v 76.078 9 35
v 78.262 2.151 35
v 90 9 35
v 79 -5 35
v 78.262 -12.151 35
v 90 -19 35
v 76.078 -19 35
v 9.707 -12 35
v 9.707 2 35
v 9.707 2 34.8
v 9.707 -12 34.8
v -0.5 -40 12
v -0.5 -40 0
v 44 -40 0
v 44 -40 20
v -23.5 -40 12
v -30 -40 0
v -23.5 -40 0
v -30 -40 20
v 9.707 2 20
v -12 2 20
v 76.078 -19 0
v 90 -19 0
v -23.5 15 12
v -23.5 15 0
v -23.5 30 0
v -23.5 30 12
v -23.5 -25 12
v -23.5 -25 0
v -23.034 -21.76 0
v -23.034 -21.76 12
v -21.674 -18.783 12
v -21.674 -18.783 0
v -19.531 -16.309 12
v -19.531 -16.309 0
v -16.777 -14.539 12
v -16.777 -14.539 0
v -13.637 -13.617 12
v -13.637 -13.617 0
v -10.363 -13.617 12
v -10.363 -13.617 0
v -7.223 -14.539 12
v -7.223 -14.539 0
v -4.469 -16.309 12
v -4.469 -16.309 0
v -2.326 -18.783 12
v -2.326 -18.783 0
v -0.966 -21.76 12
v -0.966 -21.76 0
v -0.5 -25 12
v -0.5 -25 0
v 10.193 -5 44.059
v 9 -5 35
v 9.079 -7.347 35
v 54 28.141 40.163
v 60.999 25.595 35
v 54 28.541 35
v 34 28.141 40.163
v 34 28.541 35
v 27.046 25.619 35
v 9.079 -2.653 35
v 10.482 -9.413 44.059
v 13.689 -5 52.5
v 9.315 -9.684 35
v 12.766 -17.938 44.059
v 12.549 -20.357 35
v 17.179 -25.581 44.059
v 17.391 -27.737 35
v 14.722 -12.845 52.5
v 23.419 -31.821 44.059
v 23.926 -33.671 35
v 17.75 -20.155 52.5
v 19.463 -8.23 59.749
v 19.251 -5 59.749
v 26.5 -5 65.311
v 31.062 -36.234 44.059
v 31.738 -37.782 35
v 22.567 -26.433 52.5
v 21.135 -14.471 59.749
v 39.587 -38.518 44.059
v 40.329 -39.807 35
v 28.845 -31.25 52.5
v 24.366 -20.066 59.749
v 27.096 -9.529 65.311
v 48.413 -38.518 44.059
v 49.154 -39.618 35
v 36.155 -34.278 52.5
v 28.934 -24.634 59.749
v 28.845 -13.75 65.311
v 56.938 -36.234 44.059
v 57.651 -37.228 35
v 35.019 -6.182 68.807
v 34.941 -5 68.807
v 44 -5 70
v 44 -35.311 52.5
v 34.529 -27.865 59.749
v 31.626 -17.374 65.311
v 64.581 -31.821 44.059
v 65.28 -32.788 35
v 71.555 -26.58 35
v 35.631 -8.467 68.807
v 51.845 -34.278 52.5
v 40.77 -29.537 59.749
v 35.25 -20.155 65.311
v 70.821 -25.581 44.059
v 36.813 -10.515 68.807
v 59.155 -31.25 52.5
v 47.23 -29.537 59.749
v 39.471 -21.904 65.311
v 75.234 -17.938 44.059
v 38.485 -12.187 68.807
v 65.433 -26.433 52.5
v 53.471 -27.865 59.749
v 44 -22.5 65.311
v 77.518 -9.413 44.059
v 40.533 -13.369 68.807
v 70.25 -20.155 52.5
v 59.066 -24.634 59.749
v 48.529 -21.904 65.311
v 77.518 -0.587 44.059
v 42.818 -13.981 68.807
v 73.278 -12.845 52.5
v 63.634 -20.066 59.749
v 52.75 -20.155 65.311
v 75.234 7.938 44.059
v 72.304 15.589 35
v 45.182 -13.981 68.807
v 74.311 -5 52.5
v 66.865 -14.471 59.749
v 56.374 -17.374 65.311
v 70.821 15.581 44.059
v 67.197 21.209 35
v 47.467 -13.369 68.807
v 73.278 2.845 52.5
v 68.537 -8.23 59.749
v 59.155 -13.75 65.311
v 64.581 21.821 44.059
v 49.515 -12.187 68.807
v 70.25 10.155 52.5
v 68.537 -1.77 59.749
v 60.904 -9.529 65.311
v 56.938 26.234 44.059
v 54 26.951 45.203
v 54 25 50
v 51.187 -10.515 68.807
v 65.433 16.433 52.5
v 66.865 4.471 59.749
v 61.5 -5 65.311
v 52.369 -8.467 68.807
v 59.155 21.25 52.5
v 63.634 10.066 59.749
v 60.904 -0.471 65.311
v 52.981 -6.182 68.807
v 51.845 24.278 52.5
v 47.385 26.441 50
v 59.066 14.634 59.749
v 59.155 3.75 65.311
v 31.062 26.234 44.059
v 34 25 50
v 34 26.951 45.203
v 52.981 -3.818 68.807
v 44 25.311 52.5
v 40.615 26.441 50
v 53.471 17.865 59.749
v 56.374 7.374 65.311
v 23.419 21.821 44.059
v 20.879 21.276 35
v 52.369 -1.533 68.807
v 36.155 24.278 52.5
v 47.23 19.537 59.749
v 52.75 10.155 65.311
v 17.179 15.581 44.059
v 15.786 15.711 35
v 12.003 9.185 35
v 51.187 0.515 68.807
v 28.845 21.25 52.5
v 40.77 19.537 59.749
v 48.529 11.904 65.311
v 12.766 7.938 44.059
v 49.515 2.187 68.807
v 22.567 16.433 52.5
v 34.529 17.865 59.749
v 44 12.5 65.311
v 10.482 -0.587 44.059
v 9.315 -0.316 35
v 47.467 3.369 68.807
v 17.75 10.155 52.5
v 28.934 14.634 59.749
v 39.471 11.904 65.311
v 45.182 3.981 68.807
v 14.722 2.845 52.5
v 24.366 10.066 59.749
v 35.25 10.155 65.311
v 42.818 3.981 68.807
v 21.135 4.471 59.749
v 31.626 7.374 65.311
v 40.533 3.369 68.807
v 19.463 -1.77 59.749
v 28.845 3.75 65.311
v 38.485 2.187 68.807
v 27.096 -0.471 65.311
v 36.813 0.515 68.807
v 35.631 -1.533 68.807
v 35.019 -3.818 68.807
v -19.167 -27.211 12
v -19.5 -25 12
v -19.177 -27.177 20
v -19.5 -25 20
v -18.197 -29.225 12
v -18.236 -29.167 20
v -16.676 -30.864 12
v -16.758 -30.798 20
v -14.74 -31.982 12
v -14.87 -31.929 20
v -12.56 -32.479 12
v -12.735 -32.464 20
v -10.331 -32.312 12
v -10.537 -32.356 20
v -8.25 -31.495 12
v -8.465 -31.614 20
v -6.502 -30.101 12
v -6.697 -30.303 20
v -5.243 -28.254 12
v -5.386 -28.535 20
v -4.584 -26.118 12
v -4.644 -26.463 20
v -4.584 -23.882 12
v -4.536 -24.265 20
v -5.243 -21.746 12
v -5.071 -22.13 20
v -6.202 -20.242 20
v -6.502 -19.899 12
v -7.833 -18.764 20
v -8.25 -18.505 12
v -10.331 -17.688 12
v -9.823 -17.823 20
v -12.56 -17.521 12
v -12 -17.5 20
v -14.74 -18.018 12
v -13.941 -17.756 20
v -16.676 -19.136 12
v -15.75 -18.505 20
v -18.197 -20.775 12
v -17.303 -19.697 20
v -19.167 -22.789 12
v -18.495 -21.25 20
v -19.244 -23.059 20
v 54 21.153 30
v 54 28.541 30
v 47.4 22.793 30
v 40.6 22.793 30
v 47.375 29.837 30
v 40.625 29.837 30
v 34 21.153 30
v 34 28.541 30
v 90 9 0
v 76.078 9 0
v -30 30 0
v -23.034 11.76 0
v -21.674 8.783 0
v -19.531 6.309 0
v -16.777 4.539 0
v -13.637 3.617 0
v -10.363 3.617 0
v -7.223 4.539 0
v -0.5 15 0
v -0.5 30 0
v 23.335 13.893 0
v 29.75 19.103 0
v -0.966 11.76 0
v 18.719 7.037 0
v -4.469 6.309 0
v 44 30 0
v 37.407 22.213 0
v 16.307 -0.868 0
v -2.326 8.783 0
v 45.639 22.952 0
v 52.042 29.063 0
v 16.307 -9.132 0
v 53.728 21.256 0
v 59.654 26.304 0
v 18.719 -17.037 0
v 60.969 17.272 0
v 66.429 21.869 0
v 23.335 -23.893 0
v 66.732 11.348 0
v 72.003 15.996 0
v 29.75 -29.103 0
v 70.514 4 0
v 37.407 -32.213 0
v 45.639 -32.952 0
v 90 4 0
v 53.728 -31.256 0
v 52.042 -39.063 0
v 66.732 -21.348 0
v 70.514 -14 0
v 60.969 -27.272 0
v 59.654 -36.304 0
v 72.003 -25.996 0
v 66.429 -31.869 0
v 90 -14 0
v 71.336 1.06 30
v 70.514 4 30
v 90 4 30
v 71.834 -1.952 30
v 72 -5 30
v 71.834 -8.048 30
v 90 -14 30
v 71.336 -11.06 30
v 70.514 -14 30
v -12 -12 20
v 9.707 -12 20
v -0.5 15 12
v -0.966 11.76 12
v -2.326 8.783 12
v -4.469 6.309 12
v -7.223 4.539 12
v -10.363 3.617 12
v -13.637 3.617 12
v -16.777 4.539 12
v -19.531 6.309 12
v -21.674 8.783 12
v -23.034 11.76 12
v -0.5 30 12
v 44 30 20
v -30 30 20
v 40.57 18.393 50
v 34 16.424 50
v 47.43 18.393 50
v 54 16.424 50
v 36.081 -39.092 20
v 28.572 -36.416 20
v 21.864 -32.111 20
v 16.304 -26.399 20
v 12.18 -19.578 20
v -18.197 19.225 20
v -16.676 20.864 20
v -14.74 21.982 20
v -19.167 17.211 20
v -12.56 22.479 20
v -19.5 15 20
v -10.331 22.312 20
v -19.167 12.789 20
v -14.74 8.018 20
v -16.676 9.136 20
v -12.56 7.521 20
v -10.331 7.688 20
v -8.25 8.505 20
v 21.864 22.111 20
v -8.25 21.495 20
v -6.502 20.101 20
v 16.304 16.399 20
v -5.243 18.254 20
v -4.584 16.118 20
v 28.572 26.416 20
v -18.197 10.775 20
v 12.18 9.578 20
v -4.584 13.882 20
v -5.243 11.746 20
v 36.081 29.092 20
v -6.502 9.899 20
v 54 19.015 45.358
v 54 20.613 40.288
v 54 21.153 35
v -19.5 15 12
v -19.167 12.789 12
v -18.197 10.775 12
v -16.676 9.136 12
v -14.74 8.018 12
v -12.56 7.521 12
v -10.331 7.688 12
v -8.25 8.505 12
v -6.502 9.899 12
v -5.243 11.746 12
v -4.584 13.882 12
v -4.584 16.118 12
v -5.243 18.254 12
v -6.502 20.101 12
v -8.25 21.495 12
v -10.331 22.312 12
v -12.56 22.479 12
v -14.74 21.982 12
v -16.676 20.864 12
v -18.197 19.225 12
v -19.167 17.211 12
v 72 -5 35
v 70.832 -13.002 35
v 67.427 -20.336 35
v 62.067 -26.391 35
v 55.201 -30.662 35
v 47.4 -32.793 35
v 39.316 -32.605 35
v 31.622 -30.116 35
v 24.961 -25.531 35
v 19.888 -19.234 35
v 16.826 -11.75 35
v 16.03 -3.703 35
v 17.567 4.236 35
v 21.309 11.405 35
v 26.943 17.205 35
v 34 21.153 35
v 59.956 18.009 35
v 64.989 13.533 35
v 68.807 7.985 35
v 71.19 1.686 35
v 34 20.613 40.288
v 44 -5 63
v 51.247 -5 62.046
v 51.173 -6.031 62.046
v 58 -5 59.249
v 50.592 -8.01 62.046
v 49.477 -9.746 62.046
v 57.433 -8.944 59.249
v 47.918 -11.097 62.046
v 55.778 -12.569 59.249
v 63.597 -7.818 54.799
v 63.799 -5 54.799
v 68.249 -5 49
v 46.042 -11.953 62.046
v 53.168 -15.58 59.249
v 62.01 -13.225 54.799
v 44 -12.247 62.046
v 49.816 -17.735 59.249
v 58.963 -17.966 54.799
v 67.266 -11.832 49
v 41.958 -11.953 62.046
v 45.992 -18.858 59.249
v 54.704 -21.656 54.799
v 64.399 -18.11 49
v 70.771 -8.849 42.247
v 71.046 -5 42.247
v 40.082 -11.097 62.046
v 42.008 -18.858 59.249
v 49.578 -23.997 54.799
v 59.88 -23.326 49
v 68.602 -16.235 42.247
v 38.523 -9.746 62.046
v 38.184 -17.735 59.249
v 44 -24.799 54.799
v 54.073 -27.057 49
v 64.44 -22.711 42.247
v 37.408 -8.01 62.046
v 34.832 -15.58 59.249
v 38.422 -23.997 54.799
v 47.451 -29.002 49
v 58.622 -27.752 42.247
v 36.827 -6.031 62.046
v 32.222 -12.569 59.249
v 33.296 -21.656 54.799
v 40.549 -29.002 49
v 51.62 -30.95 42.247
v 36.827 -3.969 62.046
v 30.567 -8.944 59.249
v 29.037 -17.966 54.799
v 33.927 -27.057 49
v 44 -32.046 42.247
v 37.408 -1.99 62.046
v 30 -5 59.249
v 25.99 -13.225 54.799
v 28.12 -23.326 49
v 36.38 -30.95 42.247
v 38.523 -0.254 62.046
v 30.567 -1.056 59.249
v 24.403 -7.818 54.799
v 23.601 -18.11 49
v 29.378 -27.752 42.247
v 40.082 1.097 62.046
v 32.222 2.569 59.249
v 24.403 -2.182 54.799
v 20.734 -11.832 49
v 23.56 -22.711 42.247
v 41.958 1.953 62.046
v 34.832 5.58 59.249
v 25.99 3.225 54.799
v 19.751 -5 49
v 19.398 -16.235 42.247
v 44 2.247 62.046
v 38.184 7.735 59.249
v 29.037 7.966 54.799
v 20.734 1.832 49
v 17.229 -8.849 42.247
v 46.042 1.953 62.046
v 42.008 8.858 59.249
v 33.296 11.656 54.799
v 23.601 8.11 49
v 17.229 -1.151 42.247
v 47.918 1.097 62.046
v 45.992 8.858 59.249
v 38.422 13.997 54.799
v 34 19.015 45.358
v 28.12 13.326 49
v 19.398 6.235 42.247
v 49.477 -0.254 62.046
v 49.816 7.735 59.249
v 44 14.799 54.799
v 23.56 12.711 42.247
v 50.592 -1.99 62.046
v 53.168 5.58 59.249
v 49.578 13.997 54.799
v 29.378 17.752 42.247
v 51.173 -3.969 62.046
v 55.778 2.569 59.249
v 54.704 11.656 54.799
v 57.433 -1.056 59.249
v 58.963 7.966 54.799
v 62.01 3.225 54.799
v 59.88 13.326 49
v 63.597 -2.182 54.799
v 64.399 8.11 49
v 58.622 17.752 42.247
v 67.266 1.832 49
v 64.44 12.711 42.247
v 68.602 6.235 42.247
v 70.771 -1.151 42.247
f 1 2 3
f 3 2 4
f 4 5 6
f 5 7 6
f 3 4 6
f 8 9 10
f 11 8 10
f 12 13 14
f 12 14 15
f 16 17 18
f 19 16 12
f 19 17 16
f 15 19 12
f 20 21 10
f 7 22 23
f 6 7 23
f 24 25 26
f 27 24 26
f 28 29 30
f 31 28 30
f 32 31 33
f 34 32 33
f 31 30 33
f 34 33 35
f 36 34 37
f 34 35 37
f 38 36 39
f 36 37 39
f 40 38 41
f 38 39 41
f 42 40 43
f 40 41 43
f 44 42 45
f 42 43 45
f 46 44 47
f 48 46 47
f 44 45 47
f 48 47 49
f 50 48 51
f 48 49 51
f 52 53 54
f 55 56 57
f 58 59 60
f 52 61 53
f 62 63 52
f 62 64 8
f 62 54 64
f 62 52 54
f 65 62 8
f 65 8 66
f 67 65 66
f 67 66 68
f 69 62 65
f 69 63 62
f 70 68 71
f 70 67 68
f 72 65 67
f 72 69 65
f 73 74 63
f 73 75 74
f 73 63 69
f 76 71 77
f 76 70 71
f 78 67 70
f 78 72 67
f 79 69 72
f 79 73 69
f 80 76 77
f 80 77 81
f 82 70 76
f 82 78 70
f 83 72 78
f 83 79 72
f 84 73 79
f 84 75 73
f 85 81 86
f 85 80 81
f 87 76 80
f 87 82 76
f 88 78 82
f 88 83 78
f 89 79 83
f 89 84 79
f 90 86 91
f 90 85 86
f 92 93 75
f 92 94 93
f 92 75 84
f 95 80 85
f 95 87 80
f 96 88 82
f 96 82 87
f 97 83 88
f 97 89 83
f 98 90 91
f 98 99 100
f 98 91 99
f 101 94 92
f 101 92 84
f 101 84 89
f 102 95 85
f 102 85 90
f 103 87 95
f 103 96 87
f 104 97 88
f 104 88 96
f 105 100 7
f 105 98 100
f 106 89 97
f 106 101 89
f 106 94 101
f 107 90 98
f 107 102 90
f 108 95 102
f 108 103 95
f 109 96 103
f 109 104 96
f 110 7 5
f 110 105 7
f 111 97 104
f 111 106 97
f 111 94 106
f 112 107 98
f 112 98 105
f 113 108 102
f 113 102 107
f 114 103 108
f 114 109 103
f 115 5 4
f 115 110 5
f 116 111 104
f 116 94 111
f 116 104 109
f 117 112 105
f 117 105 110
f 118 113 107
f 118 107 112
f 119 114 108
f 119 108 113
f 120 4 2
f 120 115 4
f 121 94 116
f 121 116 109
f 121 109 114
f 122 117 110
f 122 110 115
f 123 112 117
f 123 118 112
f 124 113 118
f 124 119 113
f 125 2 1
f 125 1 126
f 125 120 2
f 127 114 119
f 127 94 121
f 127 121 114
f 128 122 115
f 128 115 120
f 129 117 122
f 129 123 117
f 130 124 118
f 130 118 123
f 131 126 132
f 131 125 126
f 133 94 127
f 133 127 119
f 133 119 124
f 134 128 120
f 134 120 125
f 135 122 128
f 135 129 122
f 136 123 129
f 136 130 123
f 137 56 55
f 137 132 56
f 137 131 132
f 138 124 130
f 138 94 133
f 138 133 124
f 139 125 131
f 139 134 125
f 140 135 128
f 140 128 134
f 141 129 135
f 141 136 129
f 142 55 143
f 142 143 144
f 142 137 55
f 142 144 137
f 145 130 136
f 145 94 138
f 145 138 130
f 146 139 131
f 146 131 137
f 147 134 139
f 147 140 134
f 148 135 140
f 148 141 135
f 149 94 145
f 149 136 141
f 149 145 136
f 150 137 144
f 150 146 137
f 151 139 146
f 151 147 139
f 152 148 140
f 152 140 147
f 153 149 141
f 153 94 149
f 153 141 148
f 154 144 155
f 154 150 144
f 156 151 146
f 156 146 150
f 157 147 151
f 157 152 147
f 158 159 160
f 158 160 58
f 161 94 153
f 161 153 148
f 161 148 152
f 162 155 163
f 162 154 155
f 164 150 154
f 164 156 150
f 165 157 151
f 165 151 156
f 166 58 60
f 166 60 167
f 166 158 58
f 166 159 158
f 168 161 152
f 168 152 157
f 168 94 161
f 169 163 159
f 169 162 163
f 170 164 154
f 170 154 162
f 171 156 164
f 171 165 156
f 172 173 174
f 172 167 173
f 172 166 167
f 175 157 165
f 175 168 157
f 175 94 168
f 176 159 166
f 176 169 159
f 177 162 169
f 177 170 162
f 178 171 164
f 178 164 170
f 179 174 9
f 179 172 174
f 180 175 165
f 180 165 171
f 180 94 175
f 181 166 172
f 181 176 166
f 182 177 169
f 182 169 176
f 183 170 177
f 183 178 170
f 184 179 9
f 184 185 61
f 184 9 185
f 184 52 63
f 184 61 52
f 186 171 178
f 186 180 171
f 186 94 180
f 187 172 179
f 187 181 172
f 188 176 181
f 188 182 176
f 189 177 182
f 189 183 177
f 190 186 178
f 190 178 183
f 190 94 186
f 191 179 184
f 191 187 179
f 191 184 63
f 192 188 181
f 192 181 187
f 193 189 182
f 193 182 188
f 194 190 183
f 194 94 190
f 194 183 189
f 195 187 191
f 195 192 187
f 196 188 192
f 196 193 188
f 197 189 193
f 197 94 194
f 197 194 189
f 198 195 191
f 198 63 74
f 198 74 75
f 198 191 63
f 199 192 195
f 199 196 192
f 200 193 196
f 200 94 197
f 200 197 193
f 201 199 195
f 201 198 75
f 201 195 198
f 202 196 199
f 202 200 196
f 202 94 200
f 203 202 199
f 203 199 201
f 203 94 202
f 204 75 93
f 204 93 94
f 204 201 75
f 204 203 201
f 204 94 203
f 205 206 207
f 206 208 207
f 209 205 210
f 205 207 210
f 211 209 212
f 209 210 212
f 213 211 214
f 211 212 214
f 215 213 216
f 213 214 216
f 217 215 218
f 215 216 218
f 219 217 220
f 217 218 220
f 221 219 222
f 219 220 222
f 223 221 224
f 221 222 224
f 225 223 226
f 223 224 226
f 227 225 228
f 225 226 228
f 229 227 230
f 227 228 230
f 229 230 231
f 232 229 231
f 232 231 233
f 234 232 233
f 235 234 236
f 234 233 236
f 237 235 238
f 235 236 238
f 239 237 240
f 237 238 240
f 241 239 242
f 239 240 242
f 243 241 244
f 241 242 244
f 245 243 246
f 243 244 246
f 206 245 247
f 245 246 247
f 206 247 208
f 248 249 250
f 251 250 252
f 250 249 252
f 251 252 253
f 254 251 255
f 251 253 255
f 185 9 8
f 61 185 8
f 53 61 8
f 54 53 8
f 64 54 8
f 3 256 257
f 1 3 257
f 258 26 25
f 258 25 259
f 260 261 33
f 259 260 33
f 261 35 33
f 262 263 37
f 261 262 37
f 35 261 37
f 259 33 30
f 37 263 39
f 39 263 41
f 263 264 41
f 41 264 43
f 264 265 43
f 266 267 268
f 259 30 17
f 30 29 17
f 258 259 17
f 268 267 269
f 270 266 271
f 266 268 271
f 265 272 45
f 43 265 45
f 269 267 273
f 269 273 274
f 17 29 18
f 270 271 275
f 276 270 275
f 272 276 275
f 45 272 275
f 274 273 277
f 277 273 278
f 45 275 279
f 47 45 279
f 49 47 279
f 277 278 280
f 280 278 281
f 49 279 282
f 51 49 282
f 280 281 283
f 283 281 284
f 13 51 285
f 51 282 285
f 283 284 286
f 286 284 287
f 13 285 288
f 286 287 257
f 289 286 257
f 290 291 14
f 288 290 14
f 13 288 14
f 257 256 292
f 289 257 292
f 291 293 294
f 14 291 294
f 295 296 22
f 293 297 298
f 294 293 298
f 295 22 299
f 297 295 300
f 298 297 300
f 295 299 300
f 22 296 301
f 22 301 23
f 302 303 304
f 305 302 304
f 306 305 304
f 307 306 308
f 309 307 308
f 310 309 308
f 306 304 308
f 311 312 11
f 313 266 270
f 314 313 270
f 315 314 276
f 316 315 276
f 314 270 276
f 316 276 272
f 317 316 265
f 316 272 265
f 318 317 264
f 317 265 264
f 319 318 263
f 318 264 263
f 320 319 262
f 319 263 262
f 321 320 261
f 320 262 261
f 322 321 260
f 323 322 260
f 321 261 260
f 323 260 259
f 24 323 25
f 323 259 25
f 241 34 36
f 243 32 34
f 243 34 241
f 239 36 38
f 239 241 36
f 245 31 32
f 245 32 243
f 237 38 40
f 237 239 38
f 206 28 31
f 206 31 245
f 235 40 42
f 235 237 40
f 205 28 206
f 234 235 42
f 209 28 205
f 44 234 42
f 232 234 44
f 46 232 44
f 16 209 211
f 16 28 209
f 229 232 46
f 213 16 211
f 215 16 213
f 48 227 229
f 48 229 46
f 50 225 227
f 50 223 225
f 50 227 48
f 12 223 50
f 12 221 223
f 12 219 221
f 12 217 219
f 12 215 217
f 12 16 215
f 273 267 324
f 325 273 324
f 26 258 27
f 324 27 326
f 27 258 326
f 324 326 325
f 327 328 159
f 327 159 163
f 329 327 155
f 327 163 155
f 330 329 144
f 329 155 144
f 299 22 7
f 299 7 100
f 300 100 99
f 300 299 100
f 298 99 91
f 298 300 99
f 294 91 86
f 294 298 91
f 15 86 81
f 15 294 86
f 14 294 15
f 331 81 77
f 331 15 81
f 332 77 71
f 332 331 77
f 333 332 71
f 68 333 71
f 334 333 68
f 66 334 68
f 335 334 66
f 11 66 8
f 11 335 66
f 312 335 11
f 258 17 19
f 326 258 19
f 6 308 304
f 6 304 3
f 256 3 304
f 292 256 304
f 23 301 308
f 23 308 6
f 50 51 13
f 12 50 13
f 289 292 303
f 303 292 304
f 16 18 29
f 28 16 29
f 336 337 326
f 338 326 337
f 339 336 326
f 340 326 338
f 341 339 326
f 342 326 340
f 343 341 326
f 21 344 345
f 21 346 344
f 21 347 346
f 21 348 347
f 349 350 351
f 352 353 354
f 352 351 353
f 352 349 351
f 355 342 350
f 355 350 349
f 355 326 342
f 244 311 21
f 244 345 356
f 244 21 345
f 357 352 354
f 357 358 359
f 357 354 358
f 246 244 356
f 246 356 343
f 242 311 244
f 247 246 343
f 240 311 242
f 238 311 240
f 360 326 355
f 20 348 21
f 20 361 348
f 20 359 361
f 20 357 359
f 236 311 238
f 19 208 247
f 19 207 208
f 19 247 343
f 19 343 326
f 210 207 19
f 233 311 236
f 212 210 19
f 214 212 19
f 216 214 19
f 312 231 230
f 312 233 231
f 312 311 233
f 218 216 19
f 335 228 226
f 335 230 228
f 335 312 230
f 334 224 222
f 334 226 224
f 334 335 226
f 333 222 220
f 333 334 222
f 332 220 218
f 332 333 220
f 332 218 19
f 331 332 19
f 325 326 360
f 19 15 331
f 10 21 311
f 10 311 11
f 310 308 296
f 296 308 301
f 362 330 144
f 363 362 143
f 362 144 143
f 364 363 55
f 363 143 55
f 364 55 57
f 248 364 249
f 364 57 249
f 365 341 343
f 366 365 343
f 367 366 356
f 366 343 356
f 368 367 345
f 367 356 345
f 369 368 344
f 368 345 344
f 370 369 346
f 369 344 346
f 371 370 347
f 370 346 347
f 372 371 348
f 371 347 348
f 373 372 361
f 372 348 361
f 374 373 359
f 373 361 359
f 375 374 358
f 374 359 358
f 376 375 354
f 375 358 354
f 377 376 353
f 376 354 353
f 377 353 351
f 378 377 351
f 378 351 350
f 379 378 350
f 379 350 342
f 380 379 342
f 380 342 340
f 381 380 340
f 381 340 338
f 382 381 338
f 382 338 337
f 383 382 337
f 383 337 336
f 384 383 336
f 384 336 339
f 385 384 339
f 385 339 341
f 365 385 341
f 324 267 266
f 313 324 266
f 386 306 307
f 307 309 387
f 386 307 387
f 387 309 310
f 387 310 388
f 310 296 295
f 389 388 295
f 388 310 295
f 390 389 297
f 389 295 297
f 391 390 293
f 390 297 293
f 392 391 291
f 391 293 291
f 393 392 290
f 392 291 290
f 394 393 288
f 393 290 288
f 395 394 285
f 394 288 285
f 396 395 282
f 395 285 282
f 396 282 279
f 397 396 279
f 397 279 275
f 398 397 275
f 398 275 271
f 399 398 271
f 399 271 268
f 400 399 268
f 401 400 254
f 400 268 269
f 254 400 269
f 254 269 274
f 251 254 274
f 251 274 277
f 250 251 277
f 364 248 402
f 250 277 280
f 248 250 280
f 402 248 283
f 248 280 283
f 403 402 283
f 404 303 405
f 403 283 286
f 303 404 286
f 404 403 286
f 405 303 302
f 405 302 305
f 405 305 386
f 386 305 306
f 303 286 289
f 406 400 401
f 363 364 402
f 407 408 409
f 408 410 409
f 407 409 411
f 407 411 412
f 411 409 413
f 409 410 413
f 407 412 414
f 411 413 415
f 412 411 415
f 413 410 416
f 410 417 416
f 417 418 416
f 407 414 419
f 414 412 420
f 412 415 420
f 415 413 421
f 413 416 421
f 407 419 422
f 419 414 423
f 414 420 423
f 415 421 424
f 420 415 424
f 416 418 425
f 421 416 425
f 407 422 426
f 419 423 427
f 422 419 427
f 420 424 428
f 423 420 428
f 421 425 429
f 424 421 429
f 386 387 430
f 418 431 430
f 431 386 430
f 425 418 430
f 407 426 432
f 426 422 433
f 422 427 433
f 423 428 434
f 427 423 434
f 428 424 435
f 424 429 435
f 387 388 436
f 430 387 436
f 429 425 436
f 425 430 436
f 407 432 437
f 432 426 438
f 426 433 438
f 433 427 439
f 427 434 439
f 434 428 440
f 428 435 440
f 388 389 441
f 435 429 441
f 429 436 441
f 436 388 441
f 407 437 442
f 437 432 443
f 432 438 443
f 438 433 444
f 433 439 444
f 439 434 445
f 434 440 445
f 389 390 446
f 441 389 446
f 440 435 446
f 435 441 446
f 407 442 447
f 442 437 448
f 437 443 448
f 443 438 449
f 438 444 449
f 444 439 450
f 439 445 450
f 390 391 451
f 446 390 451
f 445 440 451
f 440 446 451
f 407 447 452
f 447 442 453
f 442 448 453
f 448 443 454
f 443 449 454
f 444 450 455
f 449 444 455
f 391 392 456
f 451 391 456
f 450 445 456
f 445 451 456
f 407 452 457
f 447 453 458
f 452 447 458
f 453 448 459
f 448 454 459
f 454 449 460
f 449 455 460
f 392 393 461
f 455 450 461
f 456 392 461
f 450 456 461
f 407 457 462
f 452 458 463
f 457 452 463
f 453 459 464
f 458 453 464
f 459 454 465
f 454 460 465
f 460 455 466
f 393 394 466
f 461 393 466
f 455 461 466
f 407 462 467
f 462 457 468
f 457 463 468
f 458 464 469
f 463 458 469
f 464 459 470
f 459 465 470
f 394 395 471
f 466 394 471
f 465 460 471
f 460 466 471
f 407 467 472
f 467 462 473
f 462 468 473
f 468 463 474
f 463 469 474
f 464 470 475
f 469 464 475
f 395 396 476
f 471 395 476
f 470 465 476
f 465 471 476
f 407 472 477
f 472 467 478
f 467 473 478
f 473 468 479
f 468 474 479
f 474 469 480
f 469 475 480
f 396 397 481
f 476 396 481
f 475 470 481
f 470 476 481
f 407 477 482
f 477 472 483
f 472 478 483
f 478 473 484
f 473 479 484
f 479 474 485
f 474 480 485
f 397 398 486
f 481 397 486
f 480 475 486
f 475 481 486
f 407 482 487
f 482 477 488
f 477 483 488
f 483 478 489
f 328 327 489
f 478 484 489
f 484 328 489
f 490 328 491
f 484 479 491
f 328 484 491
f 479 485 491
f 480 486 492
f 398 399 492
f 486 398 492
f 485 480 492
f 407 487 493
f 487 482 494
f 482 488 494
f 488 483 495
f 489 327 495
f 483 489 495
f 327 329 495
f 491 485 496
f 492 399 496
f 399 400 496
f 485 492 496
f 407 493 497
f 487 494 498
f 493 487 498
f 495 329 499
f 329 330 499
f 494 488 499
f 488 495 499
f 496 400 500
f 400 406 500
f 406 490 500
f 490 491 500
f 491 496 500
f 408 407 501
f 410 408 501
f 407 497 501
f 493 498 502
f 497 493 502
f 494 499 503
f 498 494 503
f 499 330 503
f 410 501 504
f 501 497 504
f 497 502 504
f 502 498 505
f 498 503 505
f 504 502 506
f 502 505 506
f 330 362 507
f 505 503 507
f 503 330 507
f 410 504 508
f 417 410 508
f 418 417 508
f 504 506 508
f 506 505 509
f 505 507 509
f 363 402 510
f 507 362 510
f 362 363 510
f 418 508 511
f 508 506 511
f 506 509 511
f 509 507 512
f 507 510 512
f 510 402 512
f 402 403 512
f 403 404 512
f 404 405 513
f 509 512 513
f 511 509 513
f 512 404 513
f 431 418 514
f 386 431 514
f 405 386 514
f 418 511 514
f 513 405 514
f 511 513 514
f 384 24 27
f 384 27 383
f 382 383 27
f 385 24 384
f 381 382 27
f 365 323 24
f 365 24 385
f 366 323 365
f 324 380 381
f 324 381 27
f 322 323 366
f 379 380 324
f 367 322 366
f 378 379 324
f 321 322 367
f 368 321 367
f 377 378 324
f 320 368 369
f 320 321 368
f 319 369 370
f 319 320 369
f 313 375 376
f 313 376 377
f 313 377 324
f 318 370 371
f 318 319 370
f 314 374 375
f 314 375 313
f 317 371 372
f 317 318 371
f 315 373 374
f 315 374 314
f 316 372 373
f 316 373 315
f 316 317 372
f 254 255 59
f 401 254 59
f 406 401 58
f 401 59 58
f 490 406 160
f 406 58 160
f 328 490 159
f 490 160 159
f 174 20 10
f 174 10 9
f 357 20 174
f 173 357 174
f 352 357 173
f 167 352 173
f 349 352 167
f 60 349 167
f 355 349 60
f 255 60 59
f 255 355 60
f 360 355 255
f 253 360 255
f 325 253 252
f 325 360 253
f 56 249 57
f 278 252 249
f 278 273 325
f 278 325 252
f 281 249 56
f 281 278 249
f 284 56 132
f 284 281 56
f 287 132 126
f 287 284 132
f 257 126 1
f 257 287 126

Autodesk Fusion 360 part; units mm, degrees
box "BoxPrimitive1" add length 70 width 74 height 20 placed x (0, -1, 0) y (1, 0, 0) z (0, 0, 1) at (-30, 30, 0)
sketch "Sketch2" plane through (0, 0, 20) normal (0, 0, 1) x (-1, 0, 0)
  line L0 (30, 40) -> (-44, 40)
  line L1 (-44, 40) -> (-44, -30)
  line L2 (-44, -30) -> (30, -30)
  line L3 (30, -30) -> (30, 40)
  circle A0 centre (12, -15) radius 7.5
  circle A1 centre (12, 25) radius 7.5
  point P0 (30, -15)
  point P1 (30, 25)
  point P2 (12, -30)
  point P3 (12, -15)
  point P4 (12, 25)
  dimension "d9" = 15
  dimension "d10" = 15
extrude "Extrude1" cut sketch "Sketch2" against normal blind 378 contours A0 | A1
sketch "Sketch3" plane through (0, 0, 0) normal (0, 0, -1) x (1, 0, 0)
  circle A0 centre (-12, -15) radius 7.5
  circle A1 centre (-12, 25) radius 7.5
  line L0 (44, 40) -> (-30, 40)
  line L1 (-30, 40) -> (-30, -30)
  line L2 (-30, -30) -> (44, -30)
  line L3 (44, -30) -> (44, 40)
  line L4 (-0.5, 25) -> (-0.5, 40)
  line L5 (-0.5, 40) -> (-23.5, 40)
  line L6 (-23.5, 40) -> (-23.5, 25)
  line L7 (-23.5, -15) -> (-23.5, -30)
  line L8 (-23.5, -30) -> (-0.5, -30)
  line L9 (-0.5, -30) -> (-0.5, -15)
  arc A2 (-0.5, -15) -> (-23.5, -15) centre (-12, -15) ccw
  arc A3 (-23.5, 25) -> (-0.5, 25) centre (-12, 25) ccw
  dimension "d13" = 23
  dimension "d14" = 23
  dimension "d15" = 23
  dimension "d16" = 23
extrude "Extrude2" cut sketch "Sketch3" against normal blind 12 contours L0 L4 L5 L6 A3 | L2 L7 L8 L9 A2
sketch "Sketch4" plane through (0, 0, 20) normal (0, 0, 1) x (-1, 0, 0)
  circle A0 centre (12, -15) radius 7.5
  circle A1 centre (12, 25) radius 7.5
  line L0 (30, 40) -> (-44, 40)
  line L1 (-44, -30) -> (30, -30)
  line L2 (30, -30) -> (30, 40)
  circle A2 centre (-44, 5) radius 35
  point P0 (-44, 5)
extrude "Extrude3" add sketch "Sketch4" along normal blind 15 and the other way blind 20 contours A2
sketch "Sketch5" plane through (0, 0, 35) normal (0, 0, 1) x (-1, 0, 0)
  circle A0 centre (-44, 5) radius 35
sketch "Sketch6" plane through (0, 0, 35) normal (0, 0, 1) x (-1, 0, 0)
  circle A0 centre (-44, 5) radius 35
  dimension "d23" = 70
sphere "SpherePrimitive1" add diameter 70 placed x (-1, 0, 0) y (0, -1, 0) z (0, 0, 1) at (44, -5, 35)
sketch "Sketch8" plane through (0, 30, 0) normal (0, 1, 0) x (-1, 0, 0)
  line L0 (0.5, 0) -> (0.5, 12)
  line L1 (0.5, 12) -> (23.5, 12)
  line L2 (23.5, 12) -> (23.5, 0)
  line L3 (23.5, 0) -> (30, 0)
  line L4 (30, 0) -> (30, 20)
  line L5 (30, 20) -> (-44, 20)
  line L6 (-44, 20) -> (-44, 0)
  line L7 (-44, 0) -> (0.5, 0)
  line L8 (-34, 50) -> (-54, 50)
  line L9 (-54, 50) -> (-54, 30)
  line L10 (-54, 30) -> (-34, 30)
  line L11 (-34, 30) -> (-34, 50)
  line L12 (-34, 50) -> (-54, 30) construction
  line L13 (-54, 50) -> (-34, 30) construction
  point P0 (-44, 40)
  point P1 (-44, 40)
  dimension "d26" = 20
  dimension "d27" = 20
extrude "Extrude4" cut sketch "Sketch8" against normal blind 15 contours L8 L9 L10 L11
sketch "Sketch9" plane through (0, 0, 0) normal (0, 0, -1) x (1, 0, 0)
  line L0 (44, 40) -> (-0.5, 40)
  line L1 (-0.5, 40) -> (-0.5, 25)
  arc A0 (-23.5, 25) -> (-0.5, 25) centre (-12, 25) ccw
  line L2 (-23.5, 25) -> (-23.5, 40)
  line L3 (-23.5, 40) -> (-30, 40)
  line L4 (-30, 40) -> (-30, -30)
  line L5 (-30, -30) -> (-23.5, -30)
  line L6 (-23.5, -30) -> (-23.5, -15)
  arc A1 (-0.5, -15) -> (-23.5, -15) centre (-12, -15) ccw
  line L7 (-0.5, -15) -> (-0.5, -30)
  line L8 (-0.5, -30) -> (44, -30)
  arc A2 (44, -30) -> (44, 40) centre (44, 5) ccw
  circle A3 centre (44, 5) radius 28
extrude "Extrude5" cut sketch "Sketch9" against normal blind 35 contours A3
sketch "Sketch10" plane through (0, 0, 35) normal (0, 0, -1) x (1, 0, 0)
  line L0 (34, -21.1534) -> (34, -15)
  line L1 (34, -15) -> (54, -15)
  line L2 (54, -15) -> (54, -21.1534)
  arc A0 (54, -21.1534) -> (34, -21.1534) centre (44, 5) ccw
  circle A1 centre (44, 5) radius 28
sphere "SpherePrimitive2" cut diameter 56 placed x (1, 0, 0) y (0, -1, 0) z (0, 0, -1) at (44, -5, 35)
sketch "Sketch12" plane through (0, 0, 20) normal (0, 0, 1) x (-1, 0, 0)
  arc A0 (-44, -30) -> (-44, 40) centre (-44, 5) ccw
  line L0 (-44, -30) -> (30, -30)
  line L1 (30, -30) -> (30, 40)
  line L2 (30, 40) -> (-44, 40)
  circle A1 centre (12, -15) radius 7.5
  circle A2 centre (12, 25) radius 7.5
  line L3 (12, 5) -> (12, -2)
  line L4 (12, -2) -> (12, 5)
  line L5 (12, 5) -> (12, 12)
  line L6 (12, -2) -> (-11.2915, -2)
  line L7 (-11.2915, -2) -> (-11.2915, 12)
  line L8 (-11.2915, 12) -> (12, 12)
  point P0 (30, 5)
extrude "Extrude6" add sketch "Sketch12" along normal blind 15 contours A0 L6 L7 L8 | A0 L3 L4 L5 L6 L8
sketch "Sketch13" plane through (0, 2, 0) normal (0, 1, 0) x (-1, 0, 0)
  line L0 (-9.7071, 35) -> (-9.7071, 20)
  line L1 (-9.7071, 20) -> (12, 20)
  line L2 (12, 20) -> (12, 35)
  line L3 (12, 35) -> (-9.7071, 35)
  line L4 (12, 20) -> (-10, 35)
extrude "Extrude7" cut sketch "Sketch13" against normal blind 20 contours L0 L2 L3 L4
sketch "Sketch14" plane through (0, 0, 0) normal (0, 0, -1) x (1, 0, 0)
  circle A0 centre (44, 5) radius 28
  line L0 (44, 40) -> (-0.5, 40)
  line L1 (-0.5, 40) -> (-0.5, 25)
  arc A1 (-23.5, 25) -> (-0.5, 25) centre (-12, 25) ccw
  line L2 (-23.5, 25) -> (-23.5, 40)
  line L3 (-23.5, 40) -> (-30, 40)
  line L4 (-30, 40) -> (-30, -30)
  line L5 (-30, -30) -> (-23.5, -30)
  line L6 (-23.5, -30) -> (-23.5, -15)
  arc A2 (-0.5, -15) -> (-23.5, -15) centre (-12, -15) ccw
  line L7 (-0.5, -15) -> (-0.5, -30)
  line L8 (-0.5, -30) -> (44, -30)
  arc A3 (44, -30) -> (44, 40) centre (44, 5) ccw
  line L9 (-30, 5) -> (79, 5)
  line L10 (79, 5) -> (90, 5)
  line L11 (90, 5) -> (90, 19)
  line L12 (90, 19) -> (90, 5)
  line L13 (90, 5) -> (90, -9)
  line L14 (90, -9) -> (73.8174, -9)
  line L15 (73.8174, -9) -> (73.8174, 19)
  line L16 (73.8174, 19) -> (90, 19)
  line L17 (90, 19) -> (90, -9)
extrude "Extrude8" add sketch "Sketch14" against normal blind 35 contours A3 L9 L15 L16 | A3 L9 L14 L15 | A3 L10 L13 L14 L17 | A3 L10 L11 L12 L16 L17
sketch "Sketch15" plane through (90, 0, 0) normal (1, 0, 0) x (0, 1, 0)
  line L0 (-19, 0) -> (9, 0)
  line L1 (9, 0) -> (9, 35)
  line L2 (9, 35) -> (-19, 35)
  line L3 (-19, 35) -> (-19, 0)
  line L4 (-5, 0) -> (-14, 0)
  line L5 (-5, 0) -> (4, 0)
  line L6 (-14, 0) -> (4, 0)
  line L7 (4, 0) -> (4, 30)
  line L8 (4, 30) -> (-14, 30)
  line L9 (-14, 30) -> (-14, 0)
  point P0 (-5, 0)
  dimension "d48" = 30
extrude "Extrude9" cut sketch "Sketch15" against normal blind 21 contours L0 L4 L5 L6 L7 L8 L9
